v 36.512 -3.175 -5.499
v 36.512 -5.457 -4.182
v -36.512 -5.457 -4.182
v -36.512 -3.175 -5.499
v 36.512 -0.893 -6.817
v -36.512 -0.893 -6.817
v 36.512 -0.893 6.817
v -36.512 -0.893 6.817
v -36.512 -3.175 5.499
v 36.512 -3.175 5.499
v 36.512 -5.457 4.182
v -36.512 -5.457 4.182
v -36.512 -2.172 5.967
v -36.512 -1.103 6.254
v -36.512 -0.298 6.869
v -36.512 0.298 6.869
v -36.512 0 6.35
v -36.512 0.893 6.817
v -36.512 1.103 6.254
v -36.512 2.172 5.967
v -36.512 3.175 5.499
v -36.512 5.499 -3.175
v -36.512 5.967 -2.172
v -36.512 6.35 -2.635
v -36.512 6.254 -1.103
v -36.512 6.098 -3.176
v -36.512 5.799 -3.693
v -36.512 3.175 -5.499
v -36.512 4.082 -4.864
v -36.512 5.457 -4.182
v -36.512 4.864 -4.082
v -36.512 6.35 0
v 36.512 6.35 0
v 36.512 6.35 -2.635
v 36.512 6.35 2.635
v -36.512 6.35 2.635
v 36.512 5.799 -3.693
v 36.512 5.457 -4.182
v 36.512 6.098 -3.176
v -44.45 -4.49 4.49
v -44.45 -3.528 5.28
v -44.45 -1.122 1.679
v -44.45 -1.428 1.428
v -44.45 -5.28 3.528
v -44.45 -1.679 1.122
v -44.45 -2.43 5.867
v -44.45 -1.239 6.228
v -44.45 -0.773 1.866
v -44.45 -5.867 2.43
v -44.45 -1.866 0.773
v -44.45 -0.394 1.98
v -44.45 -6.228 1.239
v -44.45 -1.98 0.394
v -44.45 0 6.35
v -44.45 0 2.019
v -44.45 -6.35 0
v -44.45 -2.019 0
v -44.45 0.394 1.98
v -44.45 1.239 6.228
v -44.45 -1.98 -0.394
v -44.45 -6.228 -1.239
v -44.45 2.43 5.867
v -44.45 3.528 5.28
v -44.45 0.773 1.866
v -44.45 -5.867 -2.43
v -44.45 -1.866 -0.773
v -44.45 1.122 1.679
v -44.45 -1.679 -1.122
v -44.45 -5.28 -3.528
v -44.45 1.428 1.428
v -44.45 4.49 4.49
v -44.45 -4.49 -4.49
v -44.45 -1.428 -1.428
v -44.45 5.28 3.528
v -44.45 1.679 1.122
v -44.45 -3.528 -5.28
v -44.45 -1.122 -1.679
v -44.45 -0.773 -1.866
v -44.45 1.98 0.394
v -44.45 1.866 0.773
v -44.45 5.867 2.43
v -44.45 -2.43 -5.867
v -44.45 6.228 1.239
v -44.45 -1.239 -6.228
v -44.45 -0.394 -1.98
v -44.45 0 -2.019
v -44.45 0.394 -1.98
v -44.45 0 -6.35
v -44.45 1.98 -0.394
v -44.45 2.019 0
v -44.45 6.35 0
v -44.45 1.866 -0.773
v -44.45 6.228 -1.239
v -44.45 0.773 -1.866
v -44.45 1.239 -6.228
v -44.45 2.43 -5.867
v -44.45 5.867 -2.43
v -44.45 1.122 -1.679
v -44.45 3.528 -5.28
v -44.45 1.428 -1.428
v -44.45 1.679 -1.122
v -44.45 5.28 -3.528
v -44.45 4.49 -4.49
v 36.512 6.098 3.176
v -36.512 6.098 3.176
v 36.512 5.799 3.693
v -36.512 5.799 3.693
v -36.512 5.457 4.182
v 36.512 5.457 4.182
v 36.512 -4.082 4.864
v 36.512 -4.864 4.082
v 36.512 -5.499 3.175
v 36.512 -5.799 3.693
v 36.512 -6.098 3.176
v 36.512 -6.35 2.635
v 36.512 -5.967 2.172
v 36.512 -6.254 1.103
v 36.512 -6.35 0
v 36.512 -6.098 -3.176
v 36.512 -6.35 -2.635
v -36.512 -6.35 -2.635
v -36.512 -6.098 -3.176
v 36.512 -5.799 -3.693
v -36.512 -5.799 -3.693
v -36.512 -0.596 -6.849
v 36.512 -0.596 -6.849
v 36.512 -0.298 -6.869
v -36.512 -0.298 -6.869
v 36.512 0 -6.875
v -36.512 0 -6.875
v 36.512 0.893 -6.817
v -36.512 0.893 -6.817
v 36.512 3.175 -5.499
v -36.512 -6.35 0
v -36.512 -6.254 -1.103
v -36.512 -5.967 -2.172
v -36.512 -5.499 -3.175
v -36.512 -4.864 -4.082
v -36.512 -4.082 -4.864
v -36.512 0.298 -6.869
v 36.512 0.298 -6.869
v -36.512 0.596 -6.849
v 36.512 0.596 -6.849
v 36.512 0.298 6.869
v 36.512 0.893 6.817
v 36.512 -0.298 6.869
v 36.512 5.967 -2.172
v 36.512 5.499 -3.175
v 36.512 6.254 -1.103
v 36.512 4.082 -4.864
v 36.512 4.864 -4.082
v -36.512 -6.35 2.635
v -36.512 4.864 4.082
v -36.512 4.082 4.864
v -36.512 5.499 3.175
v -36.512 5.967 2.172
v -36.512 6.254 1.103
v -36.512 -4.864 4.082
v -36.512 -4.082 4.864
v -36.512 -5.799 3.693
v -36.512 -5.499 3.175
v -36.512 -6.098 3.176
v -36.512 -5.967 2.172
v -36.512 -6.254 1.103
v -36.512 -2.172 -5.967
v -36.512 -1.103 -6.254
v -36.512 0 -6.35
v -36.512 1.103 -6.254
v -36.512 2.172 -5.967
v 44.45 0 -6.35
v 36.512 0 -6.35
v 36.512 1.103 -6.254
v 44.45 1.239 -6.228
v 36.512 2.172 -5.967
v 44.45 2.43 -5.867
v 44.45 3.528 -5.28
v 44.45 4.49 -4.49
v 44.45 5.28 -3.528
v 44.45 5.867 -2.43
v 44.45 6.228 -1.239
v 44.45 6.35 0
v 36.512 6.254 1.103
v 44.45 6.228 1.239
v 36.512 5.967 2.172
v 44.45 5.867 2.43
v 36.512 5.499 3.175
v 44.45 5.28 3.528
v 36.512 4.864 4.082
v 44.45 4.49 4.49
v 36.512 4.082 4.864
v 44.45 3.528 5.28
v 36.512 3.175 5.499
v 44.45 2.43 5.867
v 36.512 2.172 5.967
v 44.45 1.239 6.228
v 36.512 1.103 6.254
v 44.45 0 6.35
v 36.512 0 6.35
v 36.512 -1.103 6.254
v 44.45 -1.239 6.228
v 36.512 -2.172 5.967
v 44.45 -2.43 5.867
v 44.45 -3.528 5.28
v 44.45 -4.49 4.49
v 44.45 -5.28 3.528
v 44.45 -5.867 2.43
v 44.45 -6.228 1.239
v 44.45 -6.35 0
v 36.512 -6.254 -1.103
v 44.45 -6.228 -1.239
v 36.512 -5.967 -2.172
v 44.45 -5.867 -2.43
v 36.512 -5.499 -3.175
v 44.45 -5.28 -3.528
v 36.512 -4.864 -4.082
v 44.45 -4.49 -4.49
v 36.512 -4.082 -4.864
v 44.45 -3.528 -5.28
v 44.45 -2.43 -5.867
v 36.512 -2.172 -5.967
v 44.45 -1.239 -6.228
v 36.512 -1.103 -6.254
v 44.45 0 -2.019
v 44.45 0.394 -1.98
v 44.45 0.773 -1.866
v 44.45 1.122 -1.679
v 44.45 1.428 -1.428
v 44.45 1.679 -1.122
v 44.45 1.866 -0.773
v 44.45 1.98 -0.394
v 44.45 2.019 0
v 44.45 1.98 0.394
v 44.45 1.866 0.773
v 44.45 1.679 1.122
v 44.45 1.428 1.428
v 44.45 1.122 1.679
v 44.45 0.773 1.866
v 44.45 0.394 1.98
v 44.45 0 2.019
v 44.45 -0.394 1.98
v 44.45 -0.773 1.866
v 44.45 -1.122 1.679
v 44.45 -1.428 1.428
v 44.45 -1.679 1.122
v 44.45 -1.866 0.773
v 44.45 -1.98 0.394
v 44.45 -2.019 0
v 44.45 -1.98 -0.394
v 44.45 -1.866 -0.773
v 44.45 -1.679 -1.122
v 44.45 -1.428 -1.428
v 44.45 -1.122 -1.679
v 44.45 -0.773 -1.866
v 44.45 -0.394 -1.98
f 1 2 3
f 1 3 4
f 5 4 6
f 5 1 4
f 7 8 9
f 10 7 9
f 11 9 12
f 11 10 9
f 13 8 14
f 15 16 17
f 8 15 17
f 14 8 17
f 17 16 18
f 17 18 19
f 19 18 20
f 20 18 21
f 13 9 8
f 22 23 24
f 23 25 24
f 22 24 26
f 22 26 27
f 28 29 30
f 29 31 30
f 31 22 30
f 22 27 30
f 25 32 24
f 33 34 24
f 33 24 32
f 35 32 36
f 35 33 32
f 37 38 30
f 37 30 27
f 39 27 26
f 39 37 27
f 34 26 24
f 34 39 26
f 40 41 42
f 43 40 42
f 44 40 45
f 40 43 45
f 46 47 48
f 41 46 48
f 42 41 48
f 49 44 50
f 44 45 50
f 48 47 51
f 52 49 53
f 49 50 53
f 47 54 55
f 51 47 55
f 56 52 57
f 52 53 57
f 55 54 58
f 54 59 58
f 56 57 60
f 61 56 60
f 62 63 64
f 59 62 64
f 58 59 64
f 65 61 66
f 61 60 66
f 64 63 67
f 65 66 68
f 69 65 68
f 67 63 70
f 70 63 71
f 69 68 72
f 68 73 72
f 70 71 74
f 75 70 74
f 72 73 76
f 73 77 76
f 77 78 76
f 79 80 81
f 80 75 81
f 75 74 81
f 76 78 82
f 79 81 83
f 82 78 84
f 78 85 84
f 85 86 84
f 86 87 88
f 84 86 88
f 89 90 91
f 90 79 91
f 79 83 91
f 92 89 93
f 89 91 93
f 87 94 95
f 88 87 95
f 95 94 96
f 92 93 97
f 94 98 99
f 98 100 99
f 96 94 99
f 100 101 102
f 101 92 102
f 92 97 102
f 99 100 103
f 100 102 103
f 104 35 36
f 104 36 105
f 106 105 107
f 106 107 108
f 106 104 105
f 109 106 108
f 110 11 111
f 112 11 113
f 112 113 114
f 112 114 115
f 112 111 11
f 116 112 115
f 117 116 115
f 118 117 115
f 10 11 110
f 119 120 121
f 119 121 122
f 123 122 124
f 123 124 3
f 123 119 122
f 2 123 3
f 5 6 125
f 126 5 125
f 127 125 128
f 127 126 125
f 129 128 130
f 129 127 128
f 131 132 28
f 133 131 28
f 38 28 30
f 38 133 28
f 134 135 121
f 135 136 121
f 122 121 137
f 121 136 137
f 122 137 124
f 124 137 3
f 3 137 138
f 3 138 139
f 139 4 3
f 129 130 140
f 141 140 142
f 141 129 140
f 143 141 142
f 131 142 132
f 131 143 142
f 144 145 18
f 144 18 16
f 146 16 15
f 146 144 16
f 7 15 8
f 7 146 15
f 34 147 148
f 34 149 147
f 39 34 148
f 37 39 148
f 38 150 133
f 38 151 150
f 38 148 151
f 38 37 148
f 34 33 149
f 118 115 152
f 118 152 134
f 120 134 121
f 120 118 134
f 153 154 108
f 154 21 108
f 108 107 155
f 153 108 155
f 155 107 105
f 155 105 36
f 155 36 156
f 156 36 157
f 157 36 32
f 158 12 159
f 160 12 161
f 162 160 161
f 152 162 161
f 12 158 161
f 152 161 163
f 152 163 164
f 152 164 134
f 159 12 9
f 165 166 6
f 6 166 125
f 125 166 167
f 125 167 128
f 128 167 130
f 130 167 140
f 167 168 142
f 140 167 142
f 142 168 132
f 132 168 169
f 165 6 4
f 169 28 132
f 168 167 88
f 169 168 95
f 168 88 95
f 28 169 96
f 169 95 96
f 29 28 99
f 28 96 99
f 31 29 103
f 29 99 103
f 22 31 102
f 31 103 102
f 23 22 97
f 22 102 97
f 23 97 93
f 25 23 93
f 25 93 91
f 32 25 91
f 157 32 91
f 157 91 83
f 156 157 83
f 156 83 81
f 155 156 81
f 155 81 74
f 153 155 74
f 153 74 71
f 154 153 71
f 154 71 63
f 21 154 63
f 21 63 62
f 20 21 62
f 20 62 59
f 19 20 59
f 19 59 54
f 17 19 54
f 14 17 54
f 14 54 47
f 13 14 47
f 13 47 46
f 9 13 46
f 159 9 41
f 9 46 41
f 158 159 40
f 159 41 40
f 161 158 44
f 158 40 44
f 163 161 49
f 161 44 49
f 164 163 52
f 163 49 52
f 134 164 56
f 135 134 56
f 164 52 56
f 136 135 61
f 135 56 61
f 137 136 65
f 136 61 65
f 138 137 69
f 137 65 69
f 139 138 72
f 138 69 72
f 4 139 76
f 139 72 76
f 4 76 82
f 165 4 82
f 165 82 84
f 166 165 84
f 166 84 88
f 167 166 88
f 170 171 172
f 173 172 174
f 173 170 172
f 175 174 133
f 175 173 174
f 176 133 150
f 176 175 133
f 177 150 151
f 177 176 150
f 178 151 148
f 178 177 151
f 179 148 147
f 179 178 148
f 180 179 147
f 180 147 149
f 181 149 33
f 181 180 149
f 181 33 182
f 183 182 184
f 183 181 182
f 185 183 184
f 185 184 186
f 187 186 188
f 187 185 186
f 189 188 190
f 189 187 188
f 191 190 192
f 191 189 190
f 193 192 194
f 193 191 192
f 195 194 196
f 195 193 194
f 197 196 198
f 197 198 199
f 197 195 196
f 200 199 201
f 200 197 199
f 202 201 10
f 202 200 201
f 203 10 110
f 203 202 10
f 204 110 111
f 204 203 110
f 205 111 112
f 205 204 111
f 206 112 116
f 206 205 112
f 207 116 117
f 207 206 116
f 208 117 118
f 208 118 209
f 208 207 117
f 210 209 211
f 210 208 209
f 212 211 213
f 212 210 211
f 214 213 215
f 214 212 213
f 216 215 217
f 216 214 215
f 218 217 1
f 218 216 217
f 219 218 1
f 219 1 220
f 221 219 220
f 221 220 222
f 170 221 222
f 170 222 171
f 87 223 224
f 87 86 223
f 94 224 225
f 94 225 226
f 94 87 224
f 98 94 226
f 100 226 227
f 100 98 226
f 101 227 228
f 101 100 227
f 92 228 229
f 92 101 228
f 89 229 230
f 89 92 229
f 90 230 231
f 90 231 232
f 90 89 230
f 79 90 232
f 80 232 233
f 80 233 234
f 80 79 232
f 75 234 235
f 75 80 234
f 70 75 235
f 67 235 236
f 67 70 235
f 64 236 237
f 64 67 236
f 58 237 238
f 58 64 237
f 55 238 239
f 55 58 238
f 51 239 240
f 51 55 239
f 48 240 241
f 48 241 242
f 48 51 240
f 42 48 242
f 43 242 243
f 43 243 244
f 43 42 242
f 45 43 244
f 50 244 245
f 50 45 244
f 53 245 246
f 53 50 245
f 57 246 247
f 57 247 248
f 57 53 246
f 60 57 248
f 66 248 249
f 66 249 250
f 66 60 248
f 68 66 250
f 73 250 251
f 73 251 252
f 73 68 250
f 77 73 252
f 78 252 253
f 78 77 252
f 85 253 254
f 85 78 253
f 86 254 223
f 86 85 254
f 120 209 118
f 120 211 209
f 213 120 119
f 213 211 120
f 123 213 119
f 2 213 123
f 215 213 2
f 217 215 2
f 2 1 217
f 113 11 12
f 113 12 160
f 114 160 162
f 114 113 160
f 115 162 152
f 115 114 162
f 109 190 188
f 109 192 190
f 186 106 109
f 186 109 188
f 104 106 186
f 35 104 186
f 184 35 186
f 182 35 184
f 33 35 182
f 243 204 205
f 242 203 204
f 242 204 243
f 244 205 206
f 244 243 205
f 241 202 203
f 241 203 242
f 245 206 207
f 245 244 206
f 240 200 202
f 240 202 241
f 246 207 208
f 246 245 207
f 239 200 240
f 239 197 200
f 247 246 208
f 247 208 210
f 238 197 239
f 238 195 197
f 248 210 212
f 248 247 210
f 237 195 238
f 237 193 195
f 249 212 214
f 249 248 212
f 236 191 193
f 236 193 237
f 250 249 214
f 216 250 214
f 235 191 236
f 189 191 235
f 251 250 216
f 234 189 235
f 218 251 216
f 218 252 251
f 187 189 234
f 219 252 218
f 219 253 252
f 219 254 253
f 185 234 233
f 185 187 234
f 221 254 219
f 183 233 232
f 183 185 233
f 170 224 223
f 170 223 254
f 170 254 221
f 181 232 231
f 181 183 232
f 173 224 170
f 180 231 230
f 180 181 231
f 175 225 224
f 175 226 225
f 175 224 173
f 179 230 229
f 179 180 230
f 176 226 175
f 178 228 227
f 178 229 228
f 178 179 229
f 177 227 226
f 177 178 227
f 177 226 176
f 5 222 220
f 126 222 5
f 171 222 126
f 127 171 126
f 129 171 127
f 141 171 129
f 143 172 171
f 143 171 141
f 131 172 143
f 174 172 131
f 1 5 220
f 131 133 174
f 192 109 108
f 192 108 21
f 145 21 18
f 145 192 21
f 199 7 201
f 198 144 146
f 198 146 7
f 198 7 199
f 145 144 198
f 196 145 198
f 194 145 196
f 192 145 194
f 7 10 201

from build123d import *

# Parameters (mm, degrees)
SKETCH1_R               = 2.0193
BOSS_EXTRUDE1_DEPTH     = 44.45
SKETCH2_R               = 8.89
SKETCH2_R_2             = 6.35
CUT_EXTRUDE_THIN1_DEPTH = 7.9375


with BuildPart() as part:
    # Sketch1 → Boss-Extrude1 (new, symmetric)
    with BuildSketch(Plane(origin=(0, 0, 0), x_dir=(0, 0, -1), z_dir=(1, 0, 0))):
        with BuildLine():
            ThreePointArc((6.874999966, 0), (6.860422465, 0.447468582), (6.816751782, 0.893039571))
            Line((6.816751782, 0.893039571), (4.181770846, 5.456960429))
            ThreePointArc((4.181770846, 5.456960429), (3.437499983, 5.953924622), (2.634980936, 6.35))
            Line((2.634980936, 6.35), (-2.634980936, 6.35))
            ThreePointArc((-2.634980936, 6.35), (-3.437499983, 5.953924622), (-4.181770846, 5.456960429))
            Line((-4.181770846, 5.456960429), (-6.816751782, 0.893039571))
            ThreePointArc((-6.816751782, 0.893039571), (-6.874999966, 0), (-6.816751782, -0.893039571))
            Line((-6.816751782, -0.893039571), (-4.181770846, -5.456960429))
            ThreePointArc((-4.181770846, -5.456960429), (-3.437499983, -5.953924622), (-2.634980936, -6.35))
            Line((-2.634980936, -6.35), (2.634980936, -6.35))
            ThreePointArc((2.634980936, -6.35), (3.437499983, -5.953924622), (4.181770846, -5.456960429))
            Line((4.181770846, -5.456960429), (6.816751782, -0.893039571))
            ThreePointArc((6.816751782, -0.893039571), (6.860422465, -0.447468582), (6.874999966, 0))
        make_face()
        Circle(SKETCH1_R, mode=Mode.SUBTRACT)
    extrude(amount=BOSS_EXTRUDE1_DEPTH, both=True)

    # Sketch2 → Cut-Extrude-Thin1 (cut)
    with BuildSketch(Plane(origin=(44.45, 0, 0), x_dir=(0, 0, -1), z_dir=(1, 0, 0))):
        Circle(SKETCH2_R)
        Circle(SKETCH2_R_2, mode=Mode.SUBTRACT)
    cut_extrude_thin1 = extrude(amount=-CUT_EXTRUDE_THIN1_DEPTH, mode=Mode.SUBTRACT)

    # Mirror1: Cut-Extrude-Thin1 across plane
    add(cut_extrude_thin1.mirror(Plane(origin=(0, 0, 0), x_dir=(0, 0, 1), z_dir=(1, 0, 0))), mode=Mode.SUBTRACT)


solid = part.part
